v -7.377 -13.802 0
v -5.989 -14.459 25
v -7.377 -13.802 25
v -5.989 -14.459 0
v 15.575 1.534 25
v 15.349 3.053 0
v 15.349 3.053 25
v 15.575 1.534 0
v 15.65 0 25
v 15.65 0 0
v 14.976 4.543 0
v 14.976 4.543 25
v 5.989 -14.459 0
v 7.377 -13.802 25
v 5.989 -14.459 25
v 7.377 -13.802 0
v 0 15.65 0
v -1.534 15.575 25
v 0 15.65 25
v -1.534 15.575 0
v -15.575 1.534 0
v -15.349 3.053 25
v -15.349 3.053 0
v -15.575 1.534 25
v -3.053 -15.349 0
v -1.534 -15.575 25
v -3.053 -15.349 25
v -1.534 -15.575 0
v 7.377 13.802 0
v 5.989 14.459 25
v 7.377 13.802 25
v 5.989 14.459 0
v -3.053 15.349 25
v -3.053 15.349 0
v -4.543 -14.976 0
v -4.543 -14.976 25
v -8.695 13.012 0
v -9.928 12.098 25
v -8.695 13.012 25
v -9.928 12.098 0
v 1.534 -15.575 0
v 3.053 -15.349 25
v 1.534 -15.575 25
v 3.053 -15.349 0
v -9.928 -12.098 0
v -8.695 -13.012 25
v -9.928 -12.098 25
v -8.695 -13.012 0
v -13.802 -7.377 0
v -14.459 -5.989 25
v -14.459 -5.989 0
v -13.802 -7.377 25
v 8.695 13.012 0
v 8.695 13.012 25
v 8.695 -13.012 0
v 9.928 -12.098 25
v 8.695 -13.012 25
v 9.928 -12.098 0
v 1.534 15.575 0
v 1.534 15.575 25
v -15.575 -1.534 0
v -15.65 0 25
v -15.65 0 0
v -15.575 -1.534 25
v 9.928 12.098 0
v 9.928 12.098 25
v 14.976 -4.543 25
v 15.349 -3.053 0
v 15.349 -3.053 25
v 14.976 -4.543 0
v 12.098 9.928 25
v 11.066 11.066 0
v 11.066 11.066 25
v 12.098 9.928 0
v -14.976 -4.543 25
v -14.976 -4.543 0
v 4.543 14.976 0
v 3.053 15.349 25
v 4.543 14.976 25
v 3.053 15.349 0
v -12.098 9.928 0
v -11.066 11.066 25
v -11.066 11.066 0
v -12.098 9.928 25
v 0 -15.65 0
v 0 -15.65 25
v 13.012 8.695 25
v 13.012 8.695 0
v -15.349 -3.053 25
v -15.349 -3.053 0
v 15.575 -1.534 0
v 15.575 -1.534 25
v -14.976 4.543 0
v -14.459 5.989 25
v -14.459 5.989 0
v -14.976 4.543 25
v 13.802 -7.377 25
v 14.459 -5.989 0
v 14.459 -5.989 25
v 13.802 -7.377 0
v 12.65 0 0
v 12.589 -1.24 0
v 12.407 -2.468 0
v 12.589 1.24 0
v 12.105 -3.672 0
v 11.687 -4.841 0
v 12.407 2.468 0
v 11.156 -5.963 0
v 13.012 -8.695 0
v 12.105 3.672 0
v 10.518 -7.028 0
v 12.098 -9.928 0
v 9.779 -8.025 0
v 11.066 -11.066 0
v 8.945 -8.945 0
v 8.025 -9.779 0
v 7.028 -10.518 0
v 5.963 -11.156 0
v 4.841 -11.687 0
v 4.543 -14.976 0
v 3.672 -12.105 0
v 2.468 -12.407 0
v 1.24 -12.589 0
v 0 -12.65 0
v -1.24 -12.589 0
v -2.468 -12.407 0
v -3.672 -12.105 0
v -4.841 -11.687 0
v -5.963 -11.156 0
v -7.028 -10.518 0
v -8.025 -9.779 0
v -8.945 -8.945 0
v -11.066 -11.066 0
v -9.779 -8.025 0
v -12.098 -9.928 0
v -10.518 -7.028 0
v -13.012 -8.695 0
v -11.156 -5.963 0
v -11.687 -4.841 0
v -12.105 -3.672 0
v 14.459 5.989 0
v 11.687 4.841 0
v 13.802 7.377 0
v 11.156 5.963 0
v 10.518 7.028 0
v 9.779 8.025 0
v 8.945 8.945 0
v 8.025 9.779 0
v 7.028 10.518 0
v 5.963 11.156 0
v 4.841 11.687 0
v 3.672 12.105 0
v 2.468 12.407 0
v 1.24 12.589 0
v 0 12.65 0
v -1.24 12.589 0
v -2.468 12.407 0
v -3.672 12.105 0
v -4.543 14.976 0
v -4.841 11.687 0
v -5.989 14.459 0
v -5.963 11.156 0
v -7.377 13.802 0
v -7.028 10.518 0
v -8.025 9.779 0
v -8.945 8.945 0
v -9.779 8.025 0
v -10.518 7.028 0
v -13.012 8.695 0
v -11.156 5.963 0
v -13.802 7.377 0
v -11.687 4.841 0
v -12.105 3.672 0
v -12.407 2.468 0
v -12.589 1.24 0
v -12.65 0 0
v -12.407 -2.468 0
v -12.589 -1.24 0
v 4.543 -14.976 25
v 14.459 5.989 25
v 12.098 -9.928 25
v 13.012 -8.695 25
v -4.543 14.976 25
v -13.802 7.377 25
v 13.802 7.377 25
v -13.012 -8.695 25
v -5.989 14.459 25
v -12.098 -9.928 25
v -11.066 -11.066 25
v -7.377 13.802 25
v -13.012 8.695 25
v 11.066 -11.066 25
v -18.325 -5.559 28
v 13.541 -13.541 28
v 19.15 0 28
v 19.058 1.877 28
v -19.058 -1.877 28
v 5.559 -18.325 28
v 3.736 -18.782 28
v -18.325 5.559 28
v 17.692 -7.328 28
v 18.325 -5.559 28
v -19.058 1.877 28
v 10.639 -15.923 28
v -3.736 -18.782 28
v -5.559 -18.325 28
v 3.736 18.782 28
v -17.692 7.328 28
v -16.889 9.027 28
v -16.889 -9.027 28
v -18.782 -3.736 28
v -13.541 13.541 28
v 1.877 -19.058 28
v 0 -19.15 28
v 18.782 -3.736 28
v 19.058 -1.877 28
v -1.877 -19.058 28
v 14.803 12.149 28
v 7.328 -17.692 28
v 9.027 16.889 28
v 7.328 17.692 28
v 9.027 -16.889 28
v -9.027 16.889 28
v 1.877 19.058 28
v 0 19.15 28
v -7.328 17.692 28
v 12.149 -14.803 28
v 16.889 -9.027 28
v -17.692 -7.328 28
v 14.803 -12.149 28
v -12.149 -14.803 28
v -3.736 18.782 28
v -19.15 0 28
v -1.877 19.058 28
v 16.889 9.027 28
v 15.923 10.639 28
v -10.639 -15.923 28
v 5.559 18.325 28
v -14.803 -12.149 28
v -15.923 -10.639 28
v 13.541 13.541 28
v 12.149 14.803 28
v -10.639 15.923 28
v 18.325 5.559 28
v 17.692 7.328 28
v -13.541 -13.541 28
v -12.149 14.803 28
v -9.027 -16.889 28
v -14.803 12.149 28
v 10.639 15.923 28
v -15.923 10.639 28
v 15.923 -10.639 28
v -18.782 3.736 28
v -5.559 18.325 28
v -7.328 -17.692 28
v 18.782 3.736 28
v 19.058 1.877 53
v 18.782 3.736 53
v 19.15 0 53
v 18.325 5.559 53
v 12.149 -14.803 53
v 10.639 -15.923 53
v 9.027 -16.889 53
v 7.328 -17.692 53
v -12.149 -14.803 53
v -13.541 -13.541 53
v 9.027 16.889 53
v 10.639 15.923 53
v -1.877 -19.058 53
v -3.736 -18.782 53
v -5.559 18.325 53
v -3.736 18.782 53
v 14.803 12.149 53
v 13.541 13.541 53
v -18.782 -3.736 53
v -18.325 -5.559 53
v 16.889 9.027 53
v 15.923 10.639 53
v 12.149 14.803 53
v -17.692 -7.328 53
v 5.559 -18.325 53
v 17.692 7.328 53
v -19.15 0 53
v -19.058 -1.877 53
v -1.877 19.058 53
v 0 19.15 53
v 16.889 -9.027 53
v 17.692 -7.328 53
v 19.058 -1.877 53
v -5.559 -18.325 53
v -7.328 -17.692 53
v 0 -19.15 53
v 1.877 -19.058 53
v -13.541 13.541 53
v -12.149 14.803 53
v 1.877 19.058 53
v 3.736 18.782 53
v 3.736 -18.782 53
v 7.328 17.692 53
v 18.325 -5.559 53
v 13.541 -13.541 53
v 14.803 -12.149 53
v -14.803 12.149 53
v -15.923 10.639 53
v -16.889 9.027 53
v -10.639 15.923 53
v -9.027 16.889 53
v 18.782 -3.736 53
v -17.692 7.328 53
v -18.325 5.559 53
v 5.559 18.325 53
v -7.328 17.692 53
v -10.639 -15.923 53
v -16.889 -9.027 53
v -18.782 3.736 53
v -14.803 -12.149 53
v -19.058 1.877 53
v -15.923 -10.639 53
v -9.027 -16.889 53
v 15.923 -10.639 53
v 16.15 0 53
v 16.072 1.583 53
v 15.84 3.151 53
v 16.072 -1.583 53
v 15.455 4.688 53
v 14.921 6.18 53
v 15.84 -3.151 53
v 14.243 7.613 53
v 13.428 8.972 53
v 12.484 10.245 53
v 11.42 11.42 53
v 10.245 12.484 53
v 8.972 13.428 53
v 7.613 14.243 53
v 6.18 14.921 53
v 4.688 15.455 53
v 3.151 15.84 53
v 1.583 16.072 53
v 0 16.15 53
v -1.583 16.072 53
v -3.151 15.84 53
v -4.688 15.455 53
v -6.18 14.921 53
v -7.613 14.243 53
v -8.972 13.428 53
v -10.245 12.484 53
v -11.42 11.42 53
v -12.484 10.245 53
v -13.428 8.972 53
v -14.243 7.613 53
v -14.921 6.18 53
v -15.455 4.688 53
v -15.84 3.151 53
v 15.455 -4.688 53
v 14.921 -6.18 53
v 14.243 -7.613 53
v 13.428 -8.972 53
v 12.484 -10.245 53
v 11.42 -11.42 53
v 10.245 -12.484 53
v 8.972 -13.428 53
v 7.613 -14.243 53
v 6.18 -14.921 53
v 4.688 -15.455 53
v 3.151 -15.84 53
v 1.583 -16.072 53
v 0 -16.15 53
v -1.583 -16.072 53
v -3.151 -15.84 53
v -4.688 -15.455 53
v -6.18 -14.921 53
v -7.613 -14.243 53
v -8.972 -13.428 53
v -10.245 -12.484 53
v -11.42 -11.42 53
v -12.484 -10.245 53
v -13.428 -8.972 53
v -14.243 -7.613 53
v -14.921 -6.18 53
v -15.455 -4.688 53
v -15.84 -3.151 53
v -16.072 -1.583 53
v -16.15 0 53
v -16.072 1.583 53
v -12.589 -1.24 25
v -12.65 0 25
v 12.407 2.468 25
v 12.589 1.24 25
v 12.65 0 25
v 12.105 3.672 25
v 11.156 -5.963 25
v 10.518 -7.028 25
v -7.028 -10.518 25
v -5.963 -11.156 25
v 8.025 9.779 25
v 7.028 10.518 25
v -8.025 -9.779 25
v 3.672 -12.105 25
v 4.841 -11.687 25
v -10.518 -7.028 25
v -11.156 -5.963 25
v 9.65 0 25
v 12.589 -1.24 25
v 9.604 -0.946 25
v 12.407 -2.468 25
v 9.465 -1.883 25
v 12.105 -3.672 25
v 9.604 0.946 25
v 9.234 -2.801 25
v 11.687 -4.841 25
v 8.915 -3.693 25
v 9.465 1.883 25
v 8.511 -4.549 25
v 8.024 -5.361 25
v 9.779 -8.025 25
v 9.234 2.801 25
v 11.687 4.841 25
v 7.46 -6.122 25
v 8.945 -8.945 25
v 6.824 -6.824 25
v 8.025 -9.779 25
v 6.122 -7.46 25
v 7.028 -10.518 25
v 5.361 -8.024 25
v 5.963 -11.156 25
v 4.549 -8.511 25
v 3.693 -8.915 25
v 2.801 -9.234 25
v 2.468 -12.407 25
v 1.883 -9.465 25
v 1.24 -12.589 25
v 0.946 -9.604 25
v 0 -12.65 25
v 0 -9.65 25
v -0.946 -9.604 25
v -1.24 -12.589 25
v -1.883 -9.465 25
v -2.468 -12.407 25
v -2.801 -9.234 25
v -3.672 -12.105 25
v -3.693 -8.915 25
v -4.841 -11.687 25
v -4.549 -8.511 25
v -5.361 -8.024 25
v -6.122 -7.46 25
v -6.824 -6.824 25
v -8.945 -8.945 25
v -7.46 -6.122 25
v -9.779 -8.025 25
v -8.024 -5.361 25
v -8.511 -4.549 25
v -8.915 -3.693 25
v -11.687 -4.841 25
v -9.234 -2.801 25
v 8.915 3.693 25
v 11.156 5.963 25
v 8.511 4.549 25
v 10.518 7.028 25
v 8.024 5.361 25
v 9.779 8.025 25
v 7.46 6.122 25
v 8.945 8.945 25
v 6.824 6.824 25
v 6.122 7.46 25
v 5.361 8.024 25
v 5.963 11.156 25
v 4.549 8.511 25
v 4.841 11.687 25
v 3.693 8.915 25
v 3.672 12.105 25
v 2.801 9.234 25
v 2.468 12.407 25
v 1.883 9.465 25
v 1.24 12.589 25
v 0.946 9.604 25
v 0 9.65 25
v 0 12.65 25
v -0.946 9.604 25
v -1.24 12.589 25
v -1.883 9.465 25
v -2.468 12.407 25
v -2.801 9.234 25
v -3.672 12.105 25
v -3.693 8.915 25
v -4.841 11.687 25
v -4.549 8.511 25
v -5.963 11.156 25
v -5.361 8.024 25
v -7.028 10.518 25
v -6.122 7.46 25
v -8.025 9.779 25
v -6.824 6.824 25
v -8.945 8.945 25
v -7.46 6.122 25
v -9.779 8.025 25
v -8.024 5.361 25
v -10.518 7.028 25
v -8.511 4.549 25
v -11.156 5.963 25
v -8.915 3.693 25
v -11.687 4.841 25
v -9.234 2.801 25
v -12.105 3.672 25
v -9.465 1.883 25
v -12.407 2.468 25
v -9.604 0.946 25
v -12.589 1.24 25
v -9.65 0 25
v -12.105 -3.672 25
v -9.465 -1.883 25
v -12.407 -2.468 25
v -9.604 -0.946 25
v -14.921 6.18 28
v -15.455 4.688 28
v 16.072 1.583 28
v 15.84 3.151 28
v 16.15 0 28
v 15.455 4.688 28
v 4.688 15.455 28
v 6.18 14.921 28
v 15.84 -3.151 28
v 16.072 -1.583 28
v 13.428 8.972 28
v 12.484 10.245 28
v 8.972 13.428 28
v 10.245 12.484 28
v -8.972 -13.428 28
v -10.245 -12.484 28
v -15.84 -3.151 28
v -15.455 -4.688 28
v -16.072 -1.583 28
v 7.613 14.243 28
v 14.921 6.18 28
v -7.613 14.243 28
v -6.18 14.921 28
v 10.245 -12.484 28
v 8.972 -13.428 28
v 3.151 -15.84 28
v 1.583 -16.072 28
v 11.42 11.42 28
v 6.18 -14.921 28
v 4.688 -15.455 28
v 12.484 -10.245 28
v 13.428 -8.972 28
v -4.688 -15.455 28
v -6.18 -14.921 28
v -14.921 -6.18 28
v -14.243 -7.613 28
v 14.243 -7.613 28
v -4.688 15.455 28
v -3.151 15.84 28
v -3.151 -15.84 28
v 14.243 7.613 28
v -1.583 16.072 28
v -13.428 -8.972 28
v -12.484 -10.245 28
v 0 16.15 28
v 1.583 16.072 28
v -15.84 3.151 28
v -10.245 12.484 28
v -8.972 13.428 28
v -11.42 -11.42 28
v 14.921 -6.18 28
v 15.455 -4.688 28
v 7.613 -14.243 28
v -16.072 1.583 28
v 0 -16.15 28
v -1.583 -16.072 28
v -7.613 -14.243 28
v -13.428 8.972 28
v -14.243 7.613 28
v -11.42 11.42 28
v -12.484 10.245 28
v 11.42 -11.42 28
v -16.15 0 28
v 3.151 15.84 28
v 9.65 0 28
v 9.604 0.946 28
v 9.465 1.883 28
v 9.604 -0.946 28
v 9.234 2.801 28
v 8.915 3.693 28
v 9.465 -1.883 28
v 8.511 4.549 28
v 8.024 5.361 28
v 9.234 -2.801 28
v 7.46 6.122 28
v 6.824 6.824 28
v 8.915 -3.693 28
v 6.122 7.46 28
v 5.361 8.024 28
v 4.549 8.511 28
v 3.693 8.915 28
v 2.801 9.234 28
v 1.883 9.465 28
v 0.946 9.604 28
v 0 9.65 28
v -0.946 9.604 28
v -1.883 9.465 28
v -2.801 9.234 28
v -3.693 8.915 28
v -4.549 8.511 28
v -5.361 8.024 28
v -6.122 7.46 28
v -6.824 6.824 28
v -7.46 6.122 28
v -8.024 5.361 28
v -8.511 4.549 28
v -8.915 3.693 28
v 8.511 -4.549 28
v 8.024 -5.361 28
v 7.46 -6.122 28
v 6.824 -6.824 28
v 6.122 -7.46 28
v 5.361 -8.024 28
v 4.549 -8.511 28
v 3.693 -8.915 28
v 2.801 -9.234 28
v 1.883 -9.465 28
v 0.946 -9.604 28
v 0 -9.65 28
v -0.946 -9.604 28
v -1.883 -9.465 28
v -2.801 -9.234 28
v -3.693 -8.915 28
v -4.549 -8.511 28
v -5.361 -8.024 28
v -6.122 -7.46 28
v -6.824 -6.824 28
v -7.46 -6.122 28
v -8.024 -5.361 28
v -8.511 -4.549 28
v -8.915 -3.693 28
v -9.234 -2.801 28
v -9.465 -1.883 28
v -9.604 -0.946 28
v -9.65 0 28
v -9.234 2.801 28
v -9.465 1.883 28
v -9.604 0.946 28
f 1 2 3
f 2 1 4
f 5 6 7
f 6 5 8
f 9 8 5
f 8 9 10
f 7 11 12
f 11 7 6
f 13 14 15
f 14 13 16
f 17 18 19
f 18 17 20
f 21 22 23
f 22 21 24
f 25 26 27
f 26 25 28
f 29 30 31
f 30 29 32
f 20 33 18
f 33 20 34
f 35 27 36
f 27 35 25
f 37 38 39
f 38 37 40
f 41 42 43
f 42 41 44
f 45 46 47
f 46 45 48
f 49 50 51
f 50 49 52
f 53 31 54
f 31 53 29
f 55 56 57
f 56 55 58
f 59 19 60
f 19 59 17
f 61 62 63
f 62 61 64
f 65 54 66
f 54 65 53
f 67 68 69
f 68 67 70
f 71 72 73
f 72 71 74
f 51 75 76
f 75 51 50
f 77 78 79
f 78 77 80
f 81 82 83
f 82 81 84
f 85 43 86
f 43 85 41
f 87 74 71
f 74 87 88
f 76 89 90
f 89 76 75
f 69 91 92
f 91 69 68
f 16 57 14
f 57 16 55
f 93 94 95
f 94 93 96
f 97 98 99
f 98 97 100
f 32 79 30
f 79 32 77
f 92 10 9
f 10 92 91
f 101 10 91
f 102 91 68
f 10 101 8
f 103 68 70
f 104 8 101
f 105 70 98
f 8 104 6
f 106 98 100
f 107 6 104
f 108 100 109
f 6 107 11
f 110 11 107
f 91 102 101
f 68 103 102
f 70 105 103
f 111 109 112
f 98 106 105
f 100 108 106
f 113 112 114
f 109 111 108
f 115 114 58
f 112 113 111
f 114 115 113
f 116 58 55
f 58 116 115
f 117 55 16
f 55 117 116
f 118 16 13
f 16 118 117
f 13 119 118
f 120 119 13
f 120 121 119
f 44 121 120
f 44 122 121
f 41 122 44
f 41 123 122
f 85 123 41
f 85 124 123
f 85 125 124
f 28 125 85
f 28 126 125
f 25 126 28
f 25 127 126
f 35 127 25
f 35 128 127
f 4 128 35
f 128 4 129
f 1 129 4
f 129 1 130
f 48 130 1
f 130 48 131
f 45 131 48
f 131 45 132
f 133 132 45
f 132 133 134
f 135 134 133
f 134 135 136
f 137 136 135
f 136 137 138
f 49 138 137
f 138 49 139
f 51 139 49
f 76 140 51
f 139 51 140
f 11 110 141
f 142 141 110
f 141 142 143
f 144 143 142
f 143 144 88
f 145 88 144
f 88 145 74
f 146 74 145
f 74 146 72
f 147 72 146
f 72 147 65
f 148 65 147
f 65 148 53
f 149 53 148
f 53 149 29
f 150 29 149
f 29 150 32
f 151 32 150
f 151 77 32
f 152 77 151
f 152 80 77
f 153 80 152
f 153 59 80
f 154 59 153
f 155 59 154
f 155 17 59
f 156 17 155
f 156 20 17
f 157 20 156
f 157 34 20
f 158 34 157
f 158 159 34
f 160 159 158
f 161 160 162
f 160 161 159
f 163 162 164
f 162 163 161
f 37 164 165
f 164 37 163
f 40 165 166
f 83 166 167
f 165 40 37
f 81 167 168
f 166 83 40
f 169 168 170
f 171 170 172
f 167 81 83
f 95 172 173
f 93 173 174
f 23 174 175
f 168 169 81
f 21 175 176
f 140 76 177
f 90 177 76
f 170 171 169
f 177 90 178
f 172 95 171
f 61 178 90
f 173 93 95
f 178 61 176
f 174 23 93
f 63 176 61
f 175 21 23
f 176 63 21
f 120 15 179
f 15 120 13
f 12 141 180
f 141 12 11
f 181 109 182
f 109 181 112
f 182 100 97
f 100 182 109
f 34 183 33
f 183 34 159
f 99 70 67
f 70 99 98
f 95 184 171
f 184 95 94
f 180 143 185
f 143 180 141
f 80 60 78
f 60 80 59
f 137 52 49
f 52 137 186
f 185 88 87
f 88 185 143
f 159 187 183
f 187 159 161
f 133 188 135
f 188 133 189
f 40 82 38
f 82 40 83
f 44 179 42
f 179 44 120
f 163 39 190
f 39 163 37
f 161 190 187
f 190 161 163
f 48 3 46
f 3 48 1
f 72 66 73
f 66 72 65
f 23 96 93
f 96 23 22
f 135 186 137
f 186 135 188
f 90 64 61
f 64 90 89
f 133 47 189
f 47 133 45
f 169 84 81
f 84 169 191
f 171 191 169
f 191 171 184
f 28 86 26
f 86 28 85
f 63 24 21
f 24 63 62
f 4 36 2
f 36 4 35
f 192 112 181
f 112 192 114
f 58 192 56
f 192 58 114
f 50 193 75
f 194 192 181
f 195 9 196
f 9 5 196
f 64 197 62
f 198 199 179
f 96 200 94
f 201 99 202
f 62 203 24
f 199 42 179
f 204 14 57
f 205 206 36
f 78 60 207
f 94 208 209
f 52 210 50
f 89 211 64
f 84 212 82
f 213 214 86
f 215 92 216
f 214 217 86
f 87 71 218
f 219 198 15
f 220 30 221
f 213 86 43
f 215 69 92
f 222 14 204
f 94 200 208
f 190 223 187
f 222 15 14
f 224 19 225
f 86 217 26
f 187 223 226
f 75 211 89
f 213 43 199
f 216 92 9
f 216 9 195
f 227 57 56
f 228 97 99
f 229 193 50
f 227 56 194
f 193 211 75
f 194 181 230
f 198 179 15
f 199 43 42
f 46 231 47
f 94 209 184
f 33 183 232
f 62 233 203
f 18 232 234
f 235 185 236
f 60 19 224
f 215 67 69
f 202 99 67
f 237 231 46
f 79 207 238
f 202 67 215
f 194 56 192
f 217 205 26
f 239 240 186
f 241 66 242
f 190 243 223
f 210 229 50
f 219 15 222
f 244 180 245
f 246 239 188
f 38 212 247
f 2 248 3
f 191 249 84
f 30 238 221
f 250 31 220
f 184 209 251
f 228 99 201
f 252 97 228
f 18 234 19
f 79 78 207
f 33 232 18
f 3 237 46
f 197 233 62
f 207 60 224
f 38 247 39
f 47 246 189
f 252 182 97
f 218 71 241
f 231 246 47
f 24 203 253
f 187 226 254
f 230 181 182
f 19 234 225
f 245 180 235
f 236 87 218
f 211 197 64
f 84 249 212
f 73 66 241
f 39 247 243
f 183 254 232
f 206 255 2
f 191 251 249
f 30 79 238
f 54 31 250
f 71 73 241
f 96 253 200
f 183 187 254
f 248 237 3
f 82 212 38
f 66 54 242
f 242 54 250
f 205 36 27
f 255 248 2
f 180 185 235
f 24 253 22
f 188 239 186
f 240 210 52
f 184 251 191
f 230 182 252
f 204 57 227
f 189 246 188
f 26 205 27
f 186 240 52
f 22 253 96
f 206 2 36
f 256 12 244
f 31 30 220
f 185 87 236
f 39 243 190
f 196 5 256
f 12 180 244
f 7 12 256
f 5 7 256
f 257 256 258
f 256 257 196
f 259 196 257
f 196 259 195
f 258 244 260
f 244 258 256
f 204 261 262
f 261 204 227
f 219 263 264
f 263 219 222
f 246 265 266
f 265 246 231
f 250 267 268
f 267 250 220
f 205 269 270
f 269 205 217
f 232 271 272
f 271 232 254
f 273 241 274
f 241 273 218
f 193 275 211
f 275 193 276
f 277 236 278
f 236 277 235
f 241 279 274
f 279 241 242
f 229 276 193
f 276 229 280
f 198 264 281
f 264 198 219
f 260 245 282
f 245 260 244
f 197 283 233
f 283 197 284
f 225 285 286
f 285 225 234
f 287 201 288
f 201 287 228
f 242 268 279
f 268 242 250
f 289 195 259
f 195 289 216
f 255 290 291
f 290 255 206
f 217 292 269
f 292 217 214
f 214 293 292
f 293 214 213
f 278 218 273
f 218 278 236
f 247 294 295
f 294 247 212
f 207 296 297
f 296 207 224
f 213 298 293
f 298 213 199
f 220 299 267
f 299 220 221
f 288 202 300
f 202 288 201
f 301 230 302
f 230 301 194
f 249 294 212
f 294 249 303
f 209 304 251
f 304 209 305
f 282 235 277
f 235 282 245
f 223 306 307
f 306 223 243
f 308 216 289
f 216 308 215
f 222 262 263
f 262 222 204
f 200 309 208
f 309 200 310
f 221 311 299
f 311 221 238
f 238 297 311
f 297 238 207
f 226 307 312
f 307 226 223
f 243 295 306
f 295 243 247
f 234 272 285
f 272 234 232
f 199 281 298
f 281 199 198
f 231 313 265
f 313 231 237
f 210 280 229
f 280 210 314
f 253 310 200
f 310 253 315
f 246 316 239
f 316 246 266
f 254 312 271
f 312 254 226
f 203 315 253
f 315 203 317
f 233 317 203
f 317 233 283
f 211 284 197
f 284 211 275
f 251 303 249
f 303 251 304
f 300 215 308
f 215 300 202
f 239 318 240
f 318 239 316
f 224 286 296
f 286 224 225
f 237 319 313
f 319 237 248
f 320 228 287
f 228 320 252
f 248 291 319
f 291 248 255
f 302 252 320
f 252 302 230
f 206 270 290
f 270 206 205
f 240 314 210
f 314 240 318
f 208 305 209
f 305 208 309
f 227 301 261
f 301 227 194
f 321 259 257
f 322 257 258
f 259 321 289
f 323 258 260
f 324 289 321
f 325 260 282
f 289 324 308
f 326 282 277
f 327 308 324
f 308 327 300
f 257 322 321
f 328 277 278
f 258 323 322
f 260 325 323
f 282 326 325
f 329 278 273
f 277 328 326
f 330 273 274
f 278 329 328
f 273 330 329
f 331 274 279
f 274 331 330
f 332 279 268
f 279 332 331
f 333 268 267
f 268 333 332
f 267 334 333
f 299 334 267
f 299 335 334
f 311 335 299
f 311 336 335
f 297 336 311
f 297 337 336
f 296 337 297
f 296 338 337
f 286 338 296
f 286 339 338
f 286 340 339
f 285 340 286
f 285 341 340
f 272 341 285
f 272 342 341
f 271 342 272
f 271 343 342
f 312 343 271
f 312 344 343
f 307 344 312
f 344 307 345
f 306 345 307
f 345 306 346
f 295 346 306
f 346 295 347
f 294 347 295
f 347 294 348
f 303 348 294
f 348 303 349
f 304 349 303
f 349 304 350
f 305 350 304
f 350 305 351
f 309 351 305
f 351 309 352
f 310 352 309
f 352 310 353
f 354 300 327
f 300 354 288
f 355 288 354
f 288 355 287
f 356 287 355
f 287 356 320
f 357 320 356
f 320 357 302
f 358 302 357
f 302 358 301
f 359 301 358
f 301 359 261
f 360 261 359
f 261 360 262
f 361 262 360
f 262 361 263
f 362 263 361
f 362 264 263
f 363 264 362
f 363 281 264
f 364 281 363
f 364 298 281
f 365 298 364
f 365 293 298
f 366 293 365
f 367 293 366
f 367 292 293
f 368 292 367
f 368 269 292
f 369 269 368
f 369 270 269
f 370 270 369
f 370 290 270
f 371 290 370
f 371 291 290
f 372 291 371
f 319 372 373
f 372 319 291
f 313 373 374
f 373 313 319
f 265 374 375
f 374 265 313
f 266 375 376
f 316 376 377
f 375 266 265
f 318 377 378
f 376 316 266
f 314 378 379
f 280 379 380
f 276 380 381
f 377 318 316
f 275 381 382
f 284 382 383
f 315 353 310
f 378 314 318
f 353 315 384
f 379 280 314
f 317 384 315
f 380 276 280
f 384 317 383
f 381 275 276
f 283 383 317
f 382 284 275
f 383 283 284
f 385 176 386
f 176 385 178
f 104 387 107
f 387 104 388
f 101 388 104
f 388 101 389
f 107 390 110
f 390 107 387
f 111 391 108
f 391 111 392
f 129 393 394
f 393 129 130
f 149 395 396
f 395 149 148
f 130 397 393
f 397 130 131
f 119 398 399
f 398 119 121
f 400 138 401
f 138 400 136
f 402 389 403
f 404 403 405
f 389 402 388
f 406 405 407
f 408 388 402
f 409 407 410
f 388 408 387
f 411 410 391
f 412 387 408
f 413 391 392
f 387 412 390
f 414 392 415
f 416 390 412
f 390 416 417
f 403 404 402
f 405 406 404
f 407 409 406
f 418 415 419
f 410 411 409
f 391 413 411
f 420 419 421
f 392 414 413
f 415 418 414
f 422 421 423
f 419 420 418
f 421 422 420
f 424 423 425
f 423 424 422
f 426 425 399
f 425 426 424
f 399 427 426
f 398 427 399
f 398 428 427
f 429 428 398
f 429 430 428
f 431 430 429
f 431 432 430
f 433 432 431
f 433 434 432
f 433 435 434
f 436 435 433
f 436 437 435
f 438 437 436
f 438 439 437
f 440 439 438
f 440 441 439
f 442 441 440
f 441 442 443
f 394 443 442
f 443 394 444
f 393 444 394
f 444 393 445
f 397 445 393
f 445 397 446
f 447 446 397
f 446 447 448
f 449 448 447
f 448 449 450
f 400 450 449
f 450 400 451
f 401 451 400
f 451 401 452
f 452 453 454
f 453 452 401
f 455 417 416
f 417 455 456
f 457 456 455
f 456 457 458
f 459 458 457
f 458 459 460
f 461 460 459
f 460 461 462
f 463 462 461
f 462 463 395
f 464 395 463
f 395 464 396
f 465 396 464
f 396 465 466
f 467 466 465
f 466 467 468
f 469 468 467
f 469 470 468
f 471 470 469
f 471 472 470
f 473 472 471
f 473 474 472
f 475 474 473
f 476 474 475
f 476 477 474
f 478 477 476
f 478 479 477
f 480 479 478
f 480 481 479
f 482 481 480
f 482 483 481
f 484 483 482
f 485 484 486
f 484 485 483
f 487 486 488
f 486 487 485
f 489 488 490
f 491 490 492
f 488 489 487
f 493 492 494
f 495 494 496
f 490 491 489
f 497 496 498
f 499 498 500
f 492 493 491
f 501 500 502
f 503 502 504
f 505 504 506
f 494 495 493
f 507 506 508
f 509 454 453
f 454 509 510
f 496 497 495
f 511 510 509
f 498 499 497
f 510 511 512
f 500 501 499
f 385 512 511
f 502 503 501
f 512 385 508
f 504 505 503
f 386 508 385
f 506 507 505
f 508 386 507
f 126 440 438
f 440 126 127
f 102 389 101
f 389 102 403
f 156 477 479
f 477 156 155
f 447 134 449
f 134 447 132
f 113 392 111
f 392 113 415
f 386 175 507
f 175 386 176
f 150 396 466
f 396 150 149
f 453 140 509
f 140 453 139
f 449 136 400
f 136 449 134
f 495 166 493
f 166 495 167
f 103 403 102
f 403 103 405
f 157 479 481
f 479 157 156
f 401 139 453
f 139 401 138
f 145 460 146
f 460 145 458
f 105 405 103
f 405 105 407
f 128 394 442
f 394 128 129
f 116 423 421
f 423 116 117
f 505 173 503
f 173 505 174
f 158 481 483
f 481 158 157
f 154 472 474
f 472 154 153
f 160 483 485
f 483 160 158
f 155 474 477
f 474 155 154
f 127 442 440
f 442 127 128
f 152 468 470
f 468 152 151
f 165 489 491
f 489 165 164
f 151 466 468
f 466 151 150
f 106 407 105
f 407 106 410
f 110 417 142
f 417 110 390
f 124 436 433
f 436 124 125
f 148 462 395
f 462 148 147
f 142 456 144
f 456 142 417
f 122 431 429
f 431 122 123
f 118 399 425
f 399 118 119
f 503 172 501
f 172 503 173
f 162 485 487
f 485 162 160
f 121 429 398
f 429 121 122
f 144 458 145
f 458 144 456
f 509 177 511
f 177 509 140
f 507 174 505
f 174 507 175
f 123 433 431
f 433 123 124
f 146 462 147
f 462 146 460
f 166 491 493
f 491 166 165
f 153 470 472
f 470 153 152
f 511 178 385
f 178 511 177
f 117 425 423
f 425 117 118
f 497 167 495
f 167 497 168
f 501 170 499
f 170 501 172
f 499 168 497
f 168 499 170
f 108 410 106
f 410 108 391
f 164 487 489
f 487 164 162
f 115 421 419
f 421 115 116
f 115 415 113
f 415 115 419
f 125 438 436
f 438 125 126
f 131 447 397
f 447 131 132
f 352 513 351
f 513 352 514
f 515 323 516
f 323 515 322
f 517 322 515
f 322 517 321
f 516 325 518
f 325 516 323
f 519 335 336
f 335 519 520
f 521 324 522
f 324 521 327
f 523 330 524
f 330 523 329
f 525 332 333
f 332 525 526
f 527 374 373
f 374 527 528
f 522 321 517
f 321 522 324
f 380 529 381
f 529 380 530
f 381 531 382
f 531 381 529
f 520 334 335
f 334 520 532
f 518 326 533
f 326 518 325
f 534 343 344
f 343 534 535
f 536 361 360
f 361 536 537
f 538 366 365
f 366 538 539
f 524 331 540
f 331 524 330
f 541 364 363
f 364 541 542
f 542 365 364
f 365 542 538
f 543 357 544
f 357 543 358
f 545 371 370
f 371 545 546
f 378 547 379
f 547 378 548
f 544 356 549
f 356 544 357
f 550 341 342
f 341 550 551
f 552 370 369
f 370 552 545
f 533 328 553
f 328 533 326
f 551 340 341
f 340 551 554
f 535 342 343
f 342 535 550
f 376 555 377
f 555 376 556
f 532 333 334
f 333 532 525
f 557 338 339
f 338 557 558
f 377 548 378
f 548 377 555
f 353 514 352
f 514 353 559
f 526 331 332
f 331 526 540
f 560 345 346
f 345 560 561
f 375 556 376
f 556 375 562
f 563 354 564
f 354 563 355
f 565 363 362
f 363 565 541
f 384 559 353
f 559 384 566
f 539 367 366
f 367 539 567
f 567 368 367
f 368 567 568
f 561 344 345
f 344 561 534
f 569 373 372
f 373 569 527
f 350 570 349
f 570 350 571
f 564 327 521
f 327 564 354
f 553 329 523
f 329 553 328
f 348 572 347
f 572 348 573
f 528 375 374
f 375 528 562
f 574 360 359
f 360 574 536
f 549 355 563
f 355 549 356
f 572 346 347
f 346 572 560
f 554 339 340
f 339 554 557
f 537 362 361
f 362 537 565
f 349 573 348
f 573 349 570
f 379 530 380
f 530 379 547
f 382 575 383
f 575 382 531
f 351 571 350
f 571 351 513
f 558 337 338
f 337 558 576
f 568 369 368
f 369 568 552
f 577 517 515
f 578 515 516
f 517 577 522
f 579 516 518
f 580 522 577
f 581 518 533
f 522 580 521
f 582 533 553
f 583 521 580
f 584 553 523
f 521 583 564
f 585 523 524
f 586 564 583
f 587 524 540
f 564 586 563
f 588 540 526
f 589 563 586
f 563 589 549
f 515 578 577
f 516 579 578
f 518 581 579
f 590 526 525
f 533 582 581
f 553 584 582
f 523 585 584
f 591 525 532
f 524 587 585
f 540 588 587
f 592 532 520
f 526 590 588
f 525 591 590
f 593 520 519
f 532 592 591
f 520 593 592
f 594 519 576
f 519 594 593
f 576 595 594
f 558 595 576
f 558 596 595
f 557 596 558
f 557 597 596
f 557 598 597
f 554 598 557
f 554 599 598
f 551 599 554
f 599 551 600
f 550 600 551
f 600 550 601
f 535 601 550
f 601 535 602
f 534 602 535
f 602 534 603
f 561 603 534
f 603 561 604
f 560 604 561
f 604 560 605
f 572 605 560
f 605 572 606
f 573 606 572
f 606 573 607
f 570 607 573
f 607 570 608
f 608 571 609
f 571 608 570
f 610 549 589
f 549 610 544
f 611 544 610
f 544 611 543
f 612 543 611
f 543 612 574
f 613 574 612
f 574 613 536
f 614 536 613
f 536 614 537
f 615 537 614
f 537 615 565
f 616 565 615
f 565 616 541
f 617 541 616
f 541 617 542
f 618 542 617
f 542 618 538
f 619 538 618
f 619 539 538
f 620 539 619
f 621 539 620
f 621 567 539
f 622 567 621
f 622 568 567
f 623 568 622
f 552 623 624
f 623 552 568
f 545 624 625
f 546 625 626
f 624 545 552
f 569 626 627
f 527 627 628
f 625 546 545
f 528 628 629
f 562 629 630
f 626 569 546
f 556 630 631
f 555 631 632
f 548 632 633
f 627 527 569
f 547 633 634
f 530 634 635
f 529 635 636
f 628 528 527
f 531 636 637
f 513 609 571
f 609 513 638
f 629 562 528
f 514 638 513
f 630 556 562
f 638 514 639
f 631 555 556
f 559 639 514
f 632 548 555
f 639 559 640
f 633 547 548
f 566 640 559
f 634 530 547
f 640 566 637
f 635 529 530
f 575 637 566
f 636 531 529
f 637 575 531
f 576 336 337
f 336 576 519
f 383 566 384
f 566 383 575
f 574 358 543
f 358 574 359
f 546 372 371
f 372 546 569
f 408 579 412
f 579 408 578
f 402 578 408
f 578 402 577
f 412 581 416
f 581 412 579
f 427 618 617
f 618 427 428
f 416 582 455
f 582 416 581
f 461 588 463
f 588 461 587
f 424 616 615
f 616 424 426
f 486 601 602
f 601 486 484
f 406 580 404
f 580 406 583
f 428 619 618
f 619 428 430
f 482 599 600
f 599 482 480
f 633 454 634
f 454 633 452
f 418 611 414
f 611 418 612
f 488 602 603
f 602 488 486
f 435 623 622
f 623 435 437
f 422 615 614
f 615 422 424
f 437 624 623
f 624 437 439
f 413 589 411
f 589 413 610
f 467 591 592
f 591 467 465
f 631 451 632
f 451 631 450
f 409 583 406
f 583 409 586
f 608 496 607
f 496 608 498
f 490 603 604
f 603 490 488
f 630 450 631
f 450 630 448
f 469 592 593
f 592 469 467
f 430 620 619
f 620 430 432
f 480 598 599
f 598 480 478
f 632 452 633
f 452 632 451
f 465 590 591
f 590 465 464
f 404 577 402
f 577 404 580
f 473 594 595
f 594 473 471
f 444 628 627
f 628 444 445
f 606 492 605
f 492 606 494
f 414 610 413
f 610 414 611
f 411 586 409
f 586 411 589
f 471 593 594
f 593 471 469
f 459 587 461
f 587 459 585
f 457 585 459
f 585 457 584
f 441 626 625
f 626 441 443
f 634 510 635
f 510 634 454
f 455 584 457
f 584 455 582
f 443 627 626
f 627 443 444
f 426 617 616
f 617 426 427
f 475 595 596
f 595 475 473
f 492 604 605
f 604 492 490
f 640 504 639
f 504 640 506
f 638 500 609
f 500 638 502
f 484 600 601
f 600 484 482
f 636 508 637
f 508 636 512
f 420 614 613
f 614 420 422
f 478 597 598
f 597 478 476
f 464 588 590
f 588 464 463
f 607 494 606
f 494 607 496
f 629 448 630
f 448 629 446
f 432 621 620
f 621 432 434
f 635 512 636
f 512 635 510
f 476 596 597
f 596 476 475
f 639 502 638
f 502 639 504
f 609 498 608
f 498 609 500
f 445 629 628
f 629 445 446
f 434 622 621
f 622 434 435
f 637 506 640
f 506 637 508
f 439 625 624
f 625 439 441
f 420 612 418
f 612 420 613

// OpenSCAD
// Pipe adapter: a stepped sleeve with a socket at each end that a pipe of measured outer
// diameter slides into, and a stop shoulder between them. Class B hardware-fitted part.
// Licence: CC0 1.0. Authored for the michani demo, 2026.

// Inner diameter of socket A: the measured pipe outer diameter plus clearance
socket_a_diameter = 25.3; // [8:120]
// Inner diameter of socket B: the measured pipe outer diameter plus clearance
socket_b_diameter = 32.3; // [8:120]
// How far each pipe slides into its socket
socket_depth = 25; // [10:60]
// Wall thickness around each socket
wall_thickness = 3; // [1.6:6]
// Thickness of the internal stop shoulder between the sockets
shoulder_thickness = 3; // [1.6:6]

$fn = 64;

outer_a = socket_a_diameter + 2 * wall_thickness;
outer_b = socket_b_diameter + 2 * wall_thickness;
total_height = 2 * socket_depth + shoulder_thickness;

module outer_body() {
  // Socket A below, a short cone up to socket B above, so the outside steps smoothly.
  cylinder(h = socket_depth, d = outer_a);
  translate([0, 0, socket_depth]) cylinder(h = shoulder_thickness, d1 = outer_a, d2 = outer_b);
  translate([0, 0, socket_depth + shoulder_thickness]) cylinder(h = socket_depth, d = outer_b);
}

module socket_a() {
  translate([0, 0, -1]) cylinder(h = socket_depth + 1, d = socket_a_diameter);
}

module socket_b() {
  translate([0, 0, socket_depth + shoulder_thickness]) cylinder(h = socket_depth + 1, d = socket_b_diameter);
}

module flow_bore() {
  // The shoulder keeps the pipes from meeting but must not block flow: bore it to the
  // smaller socket minus twice the wall, never below 4 mm.
  bore = max(4, min(socket_a_diameter, socket_b_diameter) - 2 * wall_thickness);
  translate([0, 0, socket_depth - 1]) cylinder(h = shoulder_thickness + 2, d = bore);
}

difference() {
  outer_body();
  socket_a();
  socket_b();
  flow_bore();
}
